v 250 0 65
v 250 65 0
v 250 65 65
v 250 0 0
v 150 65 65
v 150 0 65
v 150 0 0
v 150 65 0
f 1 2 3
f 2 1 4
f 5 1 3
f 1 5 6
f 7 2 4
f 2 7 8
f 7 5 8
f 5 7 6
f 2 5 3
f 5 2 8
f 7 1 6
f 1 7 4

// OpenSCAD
// Simple test at ocean zone location

// Ocean zone
OCEAN_X_START = 150;
OCEAN_Y_DEPTH = 65;
OCEAN_Z_HEIGHT = 65;

// Just put a colored cube at the ocean zone
color("cyan")
translate([OCEAN_X_START + 50, OCEAN_Y_DEPTH/2, OCEAN_Z_HEIGHT/2])
    cube([100, 65, 65], center=true);

// And a simple cylinder as a "shaft"
color("red")
translate([OCEAN_X_START + 50, 30, 32])
    rotate([0, 90, 0])
        cylinder(d=10, h=80, center=true, $fn=24);

echo("Test at ocean zone location - you should see cyan box and red cylinder");
